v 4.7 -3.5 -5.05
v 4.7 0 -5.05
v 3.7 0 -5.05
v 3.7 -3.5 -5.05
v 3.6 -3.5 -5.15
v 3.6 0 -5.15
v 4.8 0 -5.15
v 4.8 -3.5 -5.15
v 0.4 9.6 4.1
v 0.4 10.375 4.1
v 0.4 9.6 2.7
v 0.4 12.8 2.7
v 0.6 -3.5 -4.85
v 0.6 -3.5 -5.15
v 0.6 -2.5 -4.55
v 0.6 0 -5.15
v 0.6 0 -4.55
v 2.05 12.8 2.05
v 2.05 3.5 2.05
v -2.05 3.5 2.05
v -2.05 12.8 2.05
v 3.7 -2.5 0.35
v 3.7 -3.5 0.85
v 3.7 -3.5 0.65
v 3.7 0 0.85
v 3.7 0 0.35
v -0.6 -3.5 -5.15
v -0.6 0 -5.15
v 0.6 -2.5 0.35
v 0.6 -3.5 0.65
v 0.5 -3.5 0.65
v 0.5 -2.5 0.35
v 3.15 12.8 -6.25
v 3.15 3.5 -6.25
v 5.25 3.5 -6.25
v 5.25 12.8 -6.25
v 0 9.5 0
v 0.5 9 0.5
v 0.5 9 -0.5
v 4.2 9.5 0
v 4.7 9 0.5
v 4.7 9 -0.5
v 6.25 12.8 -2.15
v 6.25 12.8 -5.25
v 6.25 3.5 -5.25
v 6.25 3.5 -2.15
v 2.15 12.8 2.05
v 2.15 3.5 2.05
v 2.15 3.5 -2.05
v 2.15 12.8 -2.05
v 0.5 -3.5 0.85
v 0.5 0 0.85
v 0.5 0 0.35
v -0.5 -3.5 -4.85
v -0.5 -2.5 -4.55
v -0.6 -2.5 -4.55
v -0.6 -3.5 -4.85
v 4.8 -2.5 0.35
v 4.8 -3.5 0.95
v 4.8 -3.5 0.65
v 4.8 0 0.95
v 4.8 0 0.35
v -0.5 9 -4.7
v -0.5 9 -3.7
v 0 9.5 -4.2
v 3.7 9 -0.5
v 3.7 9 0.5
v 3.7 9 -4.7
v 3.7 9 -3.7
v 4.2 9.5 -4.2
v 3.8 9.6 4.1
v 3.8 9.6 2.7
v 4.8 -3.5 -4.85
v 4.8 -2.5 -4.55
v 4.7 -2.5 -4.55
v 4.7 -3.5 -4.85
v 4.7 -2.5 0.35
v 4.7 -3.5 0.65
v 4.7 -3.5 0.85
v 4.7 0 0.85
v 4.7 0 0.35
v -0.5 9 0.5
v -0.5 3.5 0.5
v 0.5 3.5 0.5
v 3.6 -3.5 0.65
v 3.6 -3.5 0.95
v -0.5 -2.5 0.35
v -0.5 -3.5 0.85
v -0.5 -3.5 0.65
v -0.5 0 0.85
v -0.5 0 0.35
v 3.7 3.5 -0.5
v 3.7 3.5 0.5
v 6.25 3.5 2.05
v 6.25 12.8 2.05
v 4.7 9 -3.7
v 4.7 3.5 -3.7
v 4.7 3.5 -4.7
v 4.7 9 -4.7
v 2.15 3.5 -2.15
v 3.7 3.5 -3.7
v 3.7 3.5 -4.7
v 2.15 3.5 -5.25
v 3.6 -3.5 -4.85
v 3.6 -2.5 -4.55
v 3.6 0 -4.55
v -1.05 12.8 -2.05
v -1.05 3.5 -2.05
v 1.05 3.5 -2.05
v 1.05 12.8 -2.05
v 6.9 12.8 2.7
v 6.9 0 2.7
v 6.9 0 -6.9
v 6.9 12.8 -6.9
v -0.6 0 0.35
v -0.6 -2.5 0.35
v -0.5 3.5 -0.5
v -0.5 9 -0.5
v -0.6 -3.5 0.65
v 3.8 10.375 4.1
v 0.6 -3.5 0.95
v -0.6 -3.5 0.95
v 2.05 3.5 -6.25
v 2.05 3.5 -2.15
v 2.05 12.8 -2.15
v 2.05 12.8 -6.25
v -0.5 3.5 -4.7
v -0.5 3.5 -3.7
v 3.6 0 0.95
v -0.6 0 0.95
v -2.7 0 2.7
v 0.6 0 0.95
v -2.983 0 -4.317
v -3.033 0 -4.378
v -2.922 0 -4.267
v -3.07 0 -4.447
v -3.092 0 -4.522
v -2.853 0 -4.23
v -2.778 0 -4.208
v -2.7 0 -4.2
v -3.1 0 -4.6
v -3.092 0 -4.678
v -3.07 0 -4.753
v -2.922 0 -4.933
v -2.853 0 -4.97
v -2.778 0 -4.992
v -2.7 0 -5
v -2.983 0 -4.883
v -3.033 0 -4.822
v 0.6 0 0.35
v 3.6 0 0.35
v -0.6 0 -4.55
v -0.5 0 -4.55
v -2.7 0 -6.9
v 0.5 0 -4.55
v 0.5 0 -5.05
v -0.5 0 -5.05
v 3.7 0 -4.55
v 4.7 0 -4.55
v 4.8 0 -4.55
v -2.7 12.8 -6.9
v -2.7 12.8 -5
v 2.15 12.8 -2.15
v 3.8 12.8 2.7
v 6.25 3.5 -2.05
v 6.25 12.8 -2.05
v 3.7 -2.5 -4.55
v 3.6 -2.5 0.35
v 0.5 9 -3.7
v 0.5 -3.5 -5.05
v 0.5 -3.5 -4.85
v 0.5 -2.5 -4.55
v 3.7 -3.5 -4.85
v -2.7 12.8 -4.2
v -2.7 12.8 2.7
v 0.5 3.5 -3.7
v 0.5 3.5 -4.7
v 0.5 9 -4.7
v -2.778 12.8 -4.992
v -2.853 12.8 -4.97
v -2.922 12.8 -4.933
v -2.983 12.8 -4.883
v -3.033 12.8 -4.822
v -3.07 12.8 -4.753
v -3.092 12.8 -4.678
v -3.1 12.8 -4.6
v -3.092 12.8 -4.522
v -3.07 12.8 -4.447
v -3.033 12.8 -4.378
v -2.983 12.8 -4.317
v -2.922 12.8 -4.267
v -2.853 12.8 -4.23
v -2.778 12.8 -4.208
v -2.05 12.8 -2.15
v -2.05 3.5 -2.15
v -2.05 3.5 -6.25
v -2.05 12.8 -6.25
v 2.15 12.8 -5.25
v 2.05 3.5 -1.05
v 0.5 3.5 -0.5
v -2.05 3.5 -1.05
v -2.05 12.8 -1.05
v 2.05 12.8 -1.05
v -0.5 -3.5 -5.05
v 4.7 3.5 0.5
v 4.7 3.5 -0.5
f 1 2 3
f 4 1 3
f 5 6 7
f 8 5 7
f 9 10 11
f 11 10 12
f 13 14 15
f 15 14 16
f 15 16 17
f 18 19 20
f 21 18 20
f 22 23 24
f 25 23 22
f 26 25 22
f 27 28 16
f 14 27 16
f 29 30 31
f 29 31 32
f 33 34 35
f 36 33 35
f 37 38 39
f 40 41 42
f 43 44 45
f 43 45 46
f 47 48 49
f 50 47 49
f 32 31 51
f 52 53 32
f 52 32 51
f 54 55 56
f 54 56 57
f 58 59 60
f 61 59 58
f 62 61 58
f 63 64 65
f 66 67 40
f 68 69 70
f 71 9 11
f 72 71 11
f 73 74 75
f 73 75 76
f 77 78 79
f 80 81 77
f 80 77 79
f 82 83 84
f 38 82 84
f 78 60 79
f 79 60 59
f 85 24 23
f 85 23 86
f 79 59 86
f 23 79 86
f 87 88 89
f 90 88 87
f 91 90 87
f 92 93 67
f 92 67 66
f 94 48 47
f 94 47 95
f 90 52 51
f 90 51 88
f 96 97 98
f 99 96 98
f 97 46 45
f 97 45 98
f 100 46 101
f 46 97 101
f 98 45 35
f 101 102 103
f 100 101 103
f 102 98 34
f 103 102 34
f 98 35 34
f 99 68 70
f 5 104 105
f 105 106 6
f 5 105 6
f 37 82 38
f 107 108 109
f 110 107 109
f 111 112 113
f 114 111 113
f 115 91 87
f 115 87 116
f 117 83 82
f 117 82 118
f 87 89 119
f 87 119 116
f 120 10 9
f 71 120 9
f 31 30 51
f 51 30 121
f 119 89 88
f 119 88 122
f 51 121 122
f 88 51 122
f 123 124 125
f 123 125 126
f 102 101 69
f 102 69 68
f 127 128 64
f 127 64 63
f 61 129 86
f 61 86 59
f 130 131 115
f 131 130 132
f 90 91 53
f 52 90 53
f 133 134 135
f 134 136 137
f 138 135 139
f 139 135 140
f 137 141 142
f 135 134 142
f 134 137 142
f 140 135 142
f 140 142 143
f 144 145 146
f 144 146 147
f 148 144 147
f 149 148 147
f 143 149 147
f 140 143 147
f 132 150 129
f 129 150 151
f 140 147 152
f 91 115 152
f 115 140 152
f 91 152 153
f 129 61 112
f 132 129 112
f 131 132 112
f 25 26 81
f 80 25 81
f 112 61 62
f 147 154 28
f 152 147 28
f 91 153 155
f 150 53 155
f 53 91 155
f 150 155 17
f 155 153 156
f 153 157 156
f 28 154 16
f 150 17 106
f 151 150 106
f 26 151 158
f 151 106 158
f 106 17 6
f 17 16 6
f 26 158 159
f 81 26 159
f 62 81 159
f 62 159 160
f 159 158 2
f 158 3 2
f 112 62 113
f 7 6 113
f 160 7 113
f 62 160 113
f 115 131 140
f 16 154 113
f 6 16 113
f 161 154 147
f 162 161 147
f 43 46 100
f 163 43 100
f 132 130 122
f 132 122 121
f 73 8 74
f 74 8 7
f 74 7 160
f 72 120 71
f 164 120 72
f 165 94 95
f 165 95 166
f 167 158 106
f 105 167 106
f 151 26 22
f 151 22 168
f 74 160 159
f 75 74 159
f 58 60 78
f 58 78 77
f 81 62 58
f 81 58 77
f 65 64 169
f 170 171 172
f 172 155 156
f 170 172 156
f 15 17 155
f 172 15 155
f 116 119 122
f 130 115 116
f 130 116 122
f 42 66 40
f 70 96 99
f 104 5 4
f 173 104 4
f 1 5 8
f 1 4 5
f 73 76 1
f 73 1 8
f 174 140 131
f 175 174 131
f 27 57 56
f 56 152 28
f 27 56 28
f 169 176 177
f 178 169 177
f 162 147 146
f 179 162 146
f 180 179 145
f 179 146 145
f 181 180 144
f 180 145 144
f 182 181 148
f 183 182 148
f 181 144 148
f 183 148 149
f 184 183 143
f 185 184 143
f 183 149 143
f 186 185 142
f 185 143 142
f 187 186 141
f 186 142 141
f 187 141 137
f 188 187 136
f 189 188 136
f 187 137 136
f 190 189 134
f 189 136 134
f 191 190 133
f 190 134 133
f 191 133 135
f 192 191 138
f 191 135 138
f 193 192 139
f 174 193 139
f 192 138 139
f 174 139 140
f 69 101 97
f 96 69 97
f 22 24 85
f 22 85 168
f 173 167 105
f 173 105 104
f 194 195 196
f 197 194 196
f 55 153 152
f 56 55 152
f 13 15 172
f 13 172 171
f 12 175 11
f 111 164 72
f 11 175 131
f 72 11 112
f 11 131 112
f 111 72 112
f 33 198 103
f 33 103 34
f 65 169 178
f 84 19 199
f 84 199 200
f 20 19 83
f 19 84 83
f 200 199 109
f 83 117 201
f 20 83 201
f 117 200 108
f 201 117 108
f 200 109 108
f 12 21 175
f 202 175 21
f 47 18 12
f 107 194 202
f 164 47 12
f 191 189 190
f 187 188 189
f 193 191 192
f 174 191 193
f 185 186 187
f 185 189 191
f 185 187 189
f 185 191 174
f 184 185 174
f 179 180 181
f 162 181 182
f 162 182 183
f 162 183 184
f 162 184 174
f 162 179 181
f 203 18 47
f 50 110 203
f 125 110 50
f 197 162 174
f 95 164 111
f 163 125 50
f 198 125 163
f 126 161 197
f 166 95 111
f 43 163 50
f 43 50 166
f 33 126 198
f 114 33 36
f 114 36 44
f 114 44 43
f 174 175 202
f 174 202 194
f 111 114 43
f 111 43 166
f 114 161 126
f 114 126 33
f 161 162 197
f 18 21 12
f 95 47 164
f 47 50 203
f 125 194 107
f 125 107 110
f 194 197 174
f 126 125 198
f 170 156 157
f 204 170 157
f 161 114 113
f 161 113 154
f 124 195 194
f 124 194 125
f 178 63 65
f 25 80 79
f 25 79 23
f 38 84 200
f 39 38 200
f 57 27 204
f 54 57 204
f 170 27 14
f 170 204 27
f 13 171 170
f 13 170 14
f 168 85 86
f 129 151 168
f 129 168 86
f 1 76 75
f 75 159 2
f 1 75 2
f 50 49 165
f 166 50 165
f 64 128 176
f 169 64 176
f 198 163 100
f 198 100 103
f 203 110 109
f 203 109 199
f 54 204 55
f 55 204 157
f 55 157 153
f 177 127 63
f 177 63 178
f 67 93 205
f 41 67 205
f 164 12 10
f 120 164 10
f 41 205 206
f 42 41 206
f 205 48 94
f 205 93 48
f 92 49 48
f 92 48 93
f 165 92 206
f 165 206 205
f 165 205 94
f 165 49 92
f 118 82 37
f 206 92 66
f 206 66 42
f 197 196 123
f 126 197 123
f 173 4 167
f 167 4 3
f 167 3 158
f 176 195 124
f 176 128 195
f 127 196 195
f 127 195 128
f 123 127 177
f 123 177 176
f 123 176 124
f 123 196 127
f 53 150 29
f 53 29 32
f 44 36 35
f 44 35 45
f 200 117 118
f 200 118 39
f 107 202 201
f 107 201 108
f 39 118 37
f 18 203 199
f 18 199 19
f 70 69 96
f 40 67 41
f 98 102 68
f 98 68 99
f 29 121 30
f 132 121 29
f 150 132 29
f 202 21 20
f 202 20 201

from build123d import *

# Parameters (mm, degrees)
HOUSING_DEPTH                      = 12.8
CUT_EXTRUDE_3_DEPTH                = 9.3
SKETCH_3_W                         = 4.1
SKETCH_3_H                         = 4.1
CUT_EXTRUDE_4_DEPTH                = 9.3
PATTERN_LINEAR_1_COUNT             = 2
PATTERN_LINEAR_1_PITCH             = 4.2
PATTERN_LINEAR_1_COUNT_DIR2        = 2
PATTERN_LINEAR_1_PITCH_DIR2        = 4.2
PATTERN_LINEAR_2_COUNT             = 2
PATTERN_LINEAR_2_PITCH             = 4.2
PATTERN_LINEAR_2_COUNT_DIR2        = 2
PATTERN_LINEAR_2_PITCH_DIR2        = 4.2
SKETCH_4_W                         = 1
SKETCH_4_H                         = 1
EXTRUDE_2286_DEPTH                 = 6
CHAMFER_1_SIZE                     = 0.5
PATTERN_LINEAR_3_COUNT             = 2
PATTERN_LINEAR_3_PITCH             = 4.2
CHAMFER_1_OF_PATTERN_LINEAR_3_SIZE = 0.5
EXTRUDE_START                      = -3.1
EXTRUDE_3473_DEPTH                 = 3.4
EXTRUDE_3845_DEPTH                 = 3.5
CUT_EXTRUDE_5_DEPTH                = 1.25
PATTERN_LINEAR_4_COUNT             = 2
PATTERN_LINEAR_4_PITCH             = 4.2


with BuildPart() as part:
    # Эскиз1 → Housing (new body)
    with BuildSketch(Plane(origin=(0, 0, 0), x_dir=(1, 0, 0), z_dir=(0, 1, 0))):
        with BuildLine():
            Line((-2.7, 4.2), (-2.7, -2.7))
            Line((-2.7, -2.7), (6.9, -2.7))
            Line((6.9, -2.7), (6.9, 6.9))
            Line((6.9, 6.9), (-2.7, 6.9))
            Line((-2.7, 6.9), (-2.7, 5))
            ThreePointArc((-2.7, 5), (-3.1, 4.6), (-2.7, 4.2))
        make_face()
    extrude(amount=HOUSING_DEPTH)

    # Эскиз2 → Вырез-Вытянуть3 (cut)
    with BuildSketch(Plane(origin=(0, 12.8, 0), x_dir=(1, 0, 0), z_dir=(0, 1, 0))):
        Polygon((-2.05, -2.05), (-2.05, 1.05), (-1.05, 2.05), (1.05, 2.05), (2.05, 1.05), (2.05, -2.05), align=None)
    cut_extrude_3 = extrude(amount=-CUT_EXTRUDE_3_DEPTH, mode=Mode.SUBTRACT)

    # Эскиз3 → Вырез-Вытянуть4 (cut)
    with BuildSketch(Plane(origin=(0, 12.8, 0), x_dir=(1, 0, 0), z_dir=(0, 1, 0))):
        with Locations((0, 4.2)):
            Rectangle(SKETCH_3_W, SKETCH_3_H)
    cut_extrude_4 = extrude(amount=-CUT_EXTRUDE_4_DEPTH, mode=Mode.SUBTRACT)

    # Линейный массив1: Cut-Extrude 4 2 × 2, 2 skipped
    with Locations(*[(i * PATTERN_LINEAR_1_PITCH, 0, j * PATTERN_LINEAR_1_PITCH_DIR2) for i in range(PATTERN_LINEAR_1_COUNT) for j in range(PATTERN_LINEAR_1_COUNT_DIR2) if (i, j) not in ((0, 0), (0, 1), (1, 0))]):
        add(cut_extrude_4, mode=Mode.SUBTRACT)

    # Линейный массив2: Cut-Extrude 3 2 × 2, 2 skipped
    with Locations(*[(i * PATTERN_LINEAR_2_PITCH, 0, -j * PATTERN_LINEAR_2_PITCH_DIR2) for i in range(PATTERN_LINEAR_2_COUNT) for j in range(PATTERN_LINEAR_2_COUNT_DIR2) if (i, j) not in ((0, 0), (0, 1), (1, 0))]):
        add(cut_extrude_3, mode=Mode.SUBTRACT)

    # Эскиз4 → Extrude 2286 (add)
    with BuildSketch(Plane(origin=(0, 3.5, 0), x_dir=(1, 0, 0), z_dir=(0, 1, 0))):
        Rectangle(SKETCH_4_W, SKETCH_4_H)
        with Locations((0, 4.2)):
            Rectangle(SKETCH_4_W, SKETCH_4_H)
    extrude_2286 = extrude(amount=EXTRUDE_2286_DEPTH)

    # Фаска1
    chamfer_1_edges = [part.edges().sort_by_distance(p)[0] for p in [
        (0.5, 9.5, 0),
        (0, 9.5, -0.5),
        (-0.5, 9.5, 0),
        (0, 9.5, 0.5),
        (0.5, 9.5, -4.2),
        (0, 9.5, -4.7),
        (-0.5, 9.5, -4.2),
        (0, 9.5, -3.7),
    ]]
    chamfer(chamfer_1_edges, length=CHAMFER_1_SIZE - 0.0001)  # a hair under: the kernel refuses the full size

    # Линейный массив3: Extrude 2286 ×2
    with Locations(*[(i * PATTERN_LINEAR_3_PITCH, 0, 0) for i in range(1, PATTERN_LINEAR_3_COUNT)]):
        add(extrude_2286)

    # Фаска1 of Линейный массив3
    chamfer_1_of_pattern_linear_3_edges = [part.edges().sort_by_distance(p)[0] for p in [
        (4.7, 9.5, 0),
        (4.2, 9.5, -0.5),
        (3.7, 9.5, 0),
        (4.2, 9.5, 0.5),
        (4.7, 9.5, -4.2),
        (4.2, 9.5, -4.7),
        (3.7, 9.5, -4.2),
        (4.2, 9.5, -3.7),
    ]]
    chamfer(chamfer_1_of_pattern_linear_3_edges, length=CHAMFER_1_OF_PATTERN_LINEAR_3_SIZE - 0.0001)  # a hair under: the kernel refuses the full size

    # Эскиз5 → Extrude 3473 (add)
    with BuildSketch(Plane.ZY.offset(2.7).offset(EXTRUDE_START)):
        Polygon((2.7, 9.6), (2.7, 12.8), (4.1, 10.375128869), (4.1, 9.6), align=None)
    extrude(amount=-EXTRUDE_3473_DEPTH)

    # Эскиз6 → Extrude 3845 (add)
    with BuildSketch(Plane.XZ):
        Polygon((-0.6, -4.55), (-0.6, -5.15), (0.6, -5.15), (0.6, -4.55), (0.5, -4.55), (0.5, -5.05), (-0.5, -5.05), (-0.5, -4.55), align=None)
        Polygon((-0.5, 0.35), (-0.6, 0.35), (-0.6, 0.95), (0.6, 0.95), (0.6, 0.35), (0.5, 0.35), (0.5, 0.85), (-0.5, 0.85), align=None)
    extrude_3845 = extrude(amount=EXTRUDE_3845_DEPTH)

    # Эскиз7 → Вырез-Вытянуть5 (cut)
    with BuildSketch(Plane(origin=(0.6, 0, 0), x_dir=(0, 0, -1), z_dir=(1, 0, 0))):
        Polygon((-0.65, -3.5), (-0.35, -2.5), (4.55, -2.5), (4.85, -3.5), align=None)
    cut_extrude_5 = extrude(amount=-CUT_EXTRUDE_5_DEPTH, mode=Mode.SUBTRACT)

    # Линейный массив4: Extrude 3845, Вырез-Вытянуть5 ×2
    with Locations(*[(i * PATTERN_LINEAR_4_PITCH, 0, 0) for i in range(1, PATTERN_LINEAR_4_COUNT)]):
        add(extrude_3845)
        add(cut_extrude_5, mode=Mode.SUBTRACT)


solid = part.part
